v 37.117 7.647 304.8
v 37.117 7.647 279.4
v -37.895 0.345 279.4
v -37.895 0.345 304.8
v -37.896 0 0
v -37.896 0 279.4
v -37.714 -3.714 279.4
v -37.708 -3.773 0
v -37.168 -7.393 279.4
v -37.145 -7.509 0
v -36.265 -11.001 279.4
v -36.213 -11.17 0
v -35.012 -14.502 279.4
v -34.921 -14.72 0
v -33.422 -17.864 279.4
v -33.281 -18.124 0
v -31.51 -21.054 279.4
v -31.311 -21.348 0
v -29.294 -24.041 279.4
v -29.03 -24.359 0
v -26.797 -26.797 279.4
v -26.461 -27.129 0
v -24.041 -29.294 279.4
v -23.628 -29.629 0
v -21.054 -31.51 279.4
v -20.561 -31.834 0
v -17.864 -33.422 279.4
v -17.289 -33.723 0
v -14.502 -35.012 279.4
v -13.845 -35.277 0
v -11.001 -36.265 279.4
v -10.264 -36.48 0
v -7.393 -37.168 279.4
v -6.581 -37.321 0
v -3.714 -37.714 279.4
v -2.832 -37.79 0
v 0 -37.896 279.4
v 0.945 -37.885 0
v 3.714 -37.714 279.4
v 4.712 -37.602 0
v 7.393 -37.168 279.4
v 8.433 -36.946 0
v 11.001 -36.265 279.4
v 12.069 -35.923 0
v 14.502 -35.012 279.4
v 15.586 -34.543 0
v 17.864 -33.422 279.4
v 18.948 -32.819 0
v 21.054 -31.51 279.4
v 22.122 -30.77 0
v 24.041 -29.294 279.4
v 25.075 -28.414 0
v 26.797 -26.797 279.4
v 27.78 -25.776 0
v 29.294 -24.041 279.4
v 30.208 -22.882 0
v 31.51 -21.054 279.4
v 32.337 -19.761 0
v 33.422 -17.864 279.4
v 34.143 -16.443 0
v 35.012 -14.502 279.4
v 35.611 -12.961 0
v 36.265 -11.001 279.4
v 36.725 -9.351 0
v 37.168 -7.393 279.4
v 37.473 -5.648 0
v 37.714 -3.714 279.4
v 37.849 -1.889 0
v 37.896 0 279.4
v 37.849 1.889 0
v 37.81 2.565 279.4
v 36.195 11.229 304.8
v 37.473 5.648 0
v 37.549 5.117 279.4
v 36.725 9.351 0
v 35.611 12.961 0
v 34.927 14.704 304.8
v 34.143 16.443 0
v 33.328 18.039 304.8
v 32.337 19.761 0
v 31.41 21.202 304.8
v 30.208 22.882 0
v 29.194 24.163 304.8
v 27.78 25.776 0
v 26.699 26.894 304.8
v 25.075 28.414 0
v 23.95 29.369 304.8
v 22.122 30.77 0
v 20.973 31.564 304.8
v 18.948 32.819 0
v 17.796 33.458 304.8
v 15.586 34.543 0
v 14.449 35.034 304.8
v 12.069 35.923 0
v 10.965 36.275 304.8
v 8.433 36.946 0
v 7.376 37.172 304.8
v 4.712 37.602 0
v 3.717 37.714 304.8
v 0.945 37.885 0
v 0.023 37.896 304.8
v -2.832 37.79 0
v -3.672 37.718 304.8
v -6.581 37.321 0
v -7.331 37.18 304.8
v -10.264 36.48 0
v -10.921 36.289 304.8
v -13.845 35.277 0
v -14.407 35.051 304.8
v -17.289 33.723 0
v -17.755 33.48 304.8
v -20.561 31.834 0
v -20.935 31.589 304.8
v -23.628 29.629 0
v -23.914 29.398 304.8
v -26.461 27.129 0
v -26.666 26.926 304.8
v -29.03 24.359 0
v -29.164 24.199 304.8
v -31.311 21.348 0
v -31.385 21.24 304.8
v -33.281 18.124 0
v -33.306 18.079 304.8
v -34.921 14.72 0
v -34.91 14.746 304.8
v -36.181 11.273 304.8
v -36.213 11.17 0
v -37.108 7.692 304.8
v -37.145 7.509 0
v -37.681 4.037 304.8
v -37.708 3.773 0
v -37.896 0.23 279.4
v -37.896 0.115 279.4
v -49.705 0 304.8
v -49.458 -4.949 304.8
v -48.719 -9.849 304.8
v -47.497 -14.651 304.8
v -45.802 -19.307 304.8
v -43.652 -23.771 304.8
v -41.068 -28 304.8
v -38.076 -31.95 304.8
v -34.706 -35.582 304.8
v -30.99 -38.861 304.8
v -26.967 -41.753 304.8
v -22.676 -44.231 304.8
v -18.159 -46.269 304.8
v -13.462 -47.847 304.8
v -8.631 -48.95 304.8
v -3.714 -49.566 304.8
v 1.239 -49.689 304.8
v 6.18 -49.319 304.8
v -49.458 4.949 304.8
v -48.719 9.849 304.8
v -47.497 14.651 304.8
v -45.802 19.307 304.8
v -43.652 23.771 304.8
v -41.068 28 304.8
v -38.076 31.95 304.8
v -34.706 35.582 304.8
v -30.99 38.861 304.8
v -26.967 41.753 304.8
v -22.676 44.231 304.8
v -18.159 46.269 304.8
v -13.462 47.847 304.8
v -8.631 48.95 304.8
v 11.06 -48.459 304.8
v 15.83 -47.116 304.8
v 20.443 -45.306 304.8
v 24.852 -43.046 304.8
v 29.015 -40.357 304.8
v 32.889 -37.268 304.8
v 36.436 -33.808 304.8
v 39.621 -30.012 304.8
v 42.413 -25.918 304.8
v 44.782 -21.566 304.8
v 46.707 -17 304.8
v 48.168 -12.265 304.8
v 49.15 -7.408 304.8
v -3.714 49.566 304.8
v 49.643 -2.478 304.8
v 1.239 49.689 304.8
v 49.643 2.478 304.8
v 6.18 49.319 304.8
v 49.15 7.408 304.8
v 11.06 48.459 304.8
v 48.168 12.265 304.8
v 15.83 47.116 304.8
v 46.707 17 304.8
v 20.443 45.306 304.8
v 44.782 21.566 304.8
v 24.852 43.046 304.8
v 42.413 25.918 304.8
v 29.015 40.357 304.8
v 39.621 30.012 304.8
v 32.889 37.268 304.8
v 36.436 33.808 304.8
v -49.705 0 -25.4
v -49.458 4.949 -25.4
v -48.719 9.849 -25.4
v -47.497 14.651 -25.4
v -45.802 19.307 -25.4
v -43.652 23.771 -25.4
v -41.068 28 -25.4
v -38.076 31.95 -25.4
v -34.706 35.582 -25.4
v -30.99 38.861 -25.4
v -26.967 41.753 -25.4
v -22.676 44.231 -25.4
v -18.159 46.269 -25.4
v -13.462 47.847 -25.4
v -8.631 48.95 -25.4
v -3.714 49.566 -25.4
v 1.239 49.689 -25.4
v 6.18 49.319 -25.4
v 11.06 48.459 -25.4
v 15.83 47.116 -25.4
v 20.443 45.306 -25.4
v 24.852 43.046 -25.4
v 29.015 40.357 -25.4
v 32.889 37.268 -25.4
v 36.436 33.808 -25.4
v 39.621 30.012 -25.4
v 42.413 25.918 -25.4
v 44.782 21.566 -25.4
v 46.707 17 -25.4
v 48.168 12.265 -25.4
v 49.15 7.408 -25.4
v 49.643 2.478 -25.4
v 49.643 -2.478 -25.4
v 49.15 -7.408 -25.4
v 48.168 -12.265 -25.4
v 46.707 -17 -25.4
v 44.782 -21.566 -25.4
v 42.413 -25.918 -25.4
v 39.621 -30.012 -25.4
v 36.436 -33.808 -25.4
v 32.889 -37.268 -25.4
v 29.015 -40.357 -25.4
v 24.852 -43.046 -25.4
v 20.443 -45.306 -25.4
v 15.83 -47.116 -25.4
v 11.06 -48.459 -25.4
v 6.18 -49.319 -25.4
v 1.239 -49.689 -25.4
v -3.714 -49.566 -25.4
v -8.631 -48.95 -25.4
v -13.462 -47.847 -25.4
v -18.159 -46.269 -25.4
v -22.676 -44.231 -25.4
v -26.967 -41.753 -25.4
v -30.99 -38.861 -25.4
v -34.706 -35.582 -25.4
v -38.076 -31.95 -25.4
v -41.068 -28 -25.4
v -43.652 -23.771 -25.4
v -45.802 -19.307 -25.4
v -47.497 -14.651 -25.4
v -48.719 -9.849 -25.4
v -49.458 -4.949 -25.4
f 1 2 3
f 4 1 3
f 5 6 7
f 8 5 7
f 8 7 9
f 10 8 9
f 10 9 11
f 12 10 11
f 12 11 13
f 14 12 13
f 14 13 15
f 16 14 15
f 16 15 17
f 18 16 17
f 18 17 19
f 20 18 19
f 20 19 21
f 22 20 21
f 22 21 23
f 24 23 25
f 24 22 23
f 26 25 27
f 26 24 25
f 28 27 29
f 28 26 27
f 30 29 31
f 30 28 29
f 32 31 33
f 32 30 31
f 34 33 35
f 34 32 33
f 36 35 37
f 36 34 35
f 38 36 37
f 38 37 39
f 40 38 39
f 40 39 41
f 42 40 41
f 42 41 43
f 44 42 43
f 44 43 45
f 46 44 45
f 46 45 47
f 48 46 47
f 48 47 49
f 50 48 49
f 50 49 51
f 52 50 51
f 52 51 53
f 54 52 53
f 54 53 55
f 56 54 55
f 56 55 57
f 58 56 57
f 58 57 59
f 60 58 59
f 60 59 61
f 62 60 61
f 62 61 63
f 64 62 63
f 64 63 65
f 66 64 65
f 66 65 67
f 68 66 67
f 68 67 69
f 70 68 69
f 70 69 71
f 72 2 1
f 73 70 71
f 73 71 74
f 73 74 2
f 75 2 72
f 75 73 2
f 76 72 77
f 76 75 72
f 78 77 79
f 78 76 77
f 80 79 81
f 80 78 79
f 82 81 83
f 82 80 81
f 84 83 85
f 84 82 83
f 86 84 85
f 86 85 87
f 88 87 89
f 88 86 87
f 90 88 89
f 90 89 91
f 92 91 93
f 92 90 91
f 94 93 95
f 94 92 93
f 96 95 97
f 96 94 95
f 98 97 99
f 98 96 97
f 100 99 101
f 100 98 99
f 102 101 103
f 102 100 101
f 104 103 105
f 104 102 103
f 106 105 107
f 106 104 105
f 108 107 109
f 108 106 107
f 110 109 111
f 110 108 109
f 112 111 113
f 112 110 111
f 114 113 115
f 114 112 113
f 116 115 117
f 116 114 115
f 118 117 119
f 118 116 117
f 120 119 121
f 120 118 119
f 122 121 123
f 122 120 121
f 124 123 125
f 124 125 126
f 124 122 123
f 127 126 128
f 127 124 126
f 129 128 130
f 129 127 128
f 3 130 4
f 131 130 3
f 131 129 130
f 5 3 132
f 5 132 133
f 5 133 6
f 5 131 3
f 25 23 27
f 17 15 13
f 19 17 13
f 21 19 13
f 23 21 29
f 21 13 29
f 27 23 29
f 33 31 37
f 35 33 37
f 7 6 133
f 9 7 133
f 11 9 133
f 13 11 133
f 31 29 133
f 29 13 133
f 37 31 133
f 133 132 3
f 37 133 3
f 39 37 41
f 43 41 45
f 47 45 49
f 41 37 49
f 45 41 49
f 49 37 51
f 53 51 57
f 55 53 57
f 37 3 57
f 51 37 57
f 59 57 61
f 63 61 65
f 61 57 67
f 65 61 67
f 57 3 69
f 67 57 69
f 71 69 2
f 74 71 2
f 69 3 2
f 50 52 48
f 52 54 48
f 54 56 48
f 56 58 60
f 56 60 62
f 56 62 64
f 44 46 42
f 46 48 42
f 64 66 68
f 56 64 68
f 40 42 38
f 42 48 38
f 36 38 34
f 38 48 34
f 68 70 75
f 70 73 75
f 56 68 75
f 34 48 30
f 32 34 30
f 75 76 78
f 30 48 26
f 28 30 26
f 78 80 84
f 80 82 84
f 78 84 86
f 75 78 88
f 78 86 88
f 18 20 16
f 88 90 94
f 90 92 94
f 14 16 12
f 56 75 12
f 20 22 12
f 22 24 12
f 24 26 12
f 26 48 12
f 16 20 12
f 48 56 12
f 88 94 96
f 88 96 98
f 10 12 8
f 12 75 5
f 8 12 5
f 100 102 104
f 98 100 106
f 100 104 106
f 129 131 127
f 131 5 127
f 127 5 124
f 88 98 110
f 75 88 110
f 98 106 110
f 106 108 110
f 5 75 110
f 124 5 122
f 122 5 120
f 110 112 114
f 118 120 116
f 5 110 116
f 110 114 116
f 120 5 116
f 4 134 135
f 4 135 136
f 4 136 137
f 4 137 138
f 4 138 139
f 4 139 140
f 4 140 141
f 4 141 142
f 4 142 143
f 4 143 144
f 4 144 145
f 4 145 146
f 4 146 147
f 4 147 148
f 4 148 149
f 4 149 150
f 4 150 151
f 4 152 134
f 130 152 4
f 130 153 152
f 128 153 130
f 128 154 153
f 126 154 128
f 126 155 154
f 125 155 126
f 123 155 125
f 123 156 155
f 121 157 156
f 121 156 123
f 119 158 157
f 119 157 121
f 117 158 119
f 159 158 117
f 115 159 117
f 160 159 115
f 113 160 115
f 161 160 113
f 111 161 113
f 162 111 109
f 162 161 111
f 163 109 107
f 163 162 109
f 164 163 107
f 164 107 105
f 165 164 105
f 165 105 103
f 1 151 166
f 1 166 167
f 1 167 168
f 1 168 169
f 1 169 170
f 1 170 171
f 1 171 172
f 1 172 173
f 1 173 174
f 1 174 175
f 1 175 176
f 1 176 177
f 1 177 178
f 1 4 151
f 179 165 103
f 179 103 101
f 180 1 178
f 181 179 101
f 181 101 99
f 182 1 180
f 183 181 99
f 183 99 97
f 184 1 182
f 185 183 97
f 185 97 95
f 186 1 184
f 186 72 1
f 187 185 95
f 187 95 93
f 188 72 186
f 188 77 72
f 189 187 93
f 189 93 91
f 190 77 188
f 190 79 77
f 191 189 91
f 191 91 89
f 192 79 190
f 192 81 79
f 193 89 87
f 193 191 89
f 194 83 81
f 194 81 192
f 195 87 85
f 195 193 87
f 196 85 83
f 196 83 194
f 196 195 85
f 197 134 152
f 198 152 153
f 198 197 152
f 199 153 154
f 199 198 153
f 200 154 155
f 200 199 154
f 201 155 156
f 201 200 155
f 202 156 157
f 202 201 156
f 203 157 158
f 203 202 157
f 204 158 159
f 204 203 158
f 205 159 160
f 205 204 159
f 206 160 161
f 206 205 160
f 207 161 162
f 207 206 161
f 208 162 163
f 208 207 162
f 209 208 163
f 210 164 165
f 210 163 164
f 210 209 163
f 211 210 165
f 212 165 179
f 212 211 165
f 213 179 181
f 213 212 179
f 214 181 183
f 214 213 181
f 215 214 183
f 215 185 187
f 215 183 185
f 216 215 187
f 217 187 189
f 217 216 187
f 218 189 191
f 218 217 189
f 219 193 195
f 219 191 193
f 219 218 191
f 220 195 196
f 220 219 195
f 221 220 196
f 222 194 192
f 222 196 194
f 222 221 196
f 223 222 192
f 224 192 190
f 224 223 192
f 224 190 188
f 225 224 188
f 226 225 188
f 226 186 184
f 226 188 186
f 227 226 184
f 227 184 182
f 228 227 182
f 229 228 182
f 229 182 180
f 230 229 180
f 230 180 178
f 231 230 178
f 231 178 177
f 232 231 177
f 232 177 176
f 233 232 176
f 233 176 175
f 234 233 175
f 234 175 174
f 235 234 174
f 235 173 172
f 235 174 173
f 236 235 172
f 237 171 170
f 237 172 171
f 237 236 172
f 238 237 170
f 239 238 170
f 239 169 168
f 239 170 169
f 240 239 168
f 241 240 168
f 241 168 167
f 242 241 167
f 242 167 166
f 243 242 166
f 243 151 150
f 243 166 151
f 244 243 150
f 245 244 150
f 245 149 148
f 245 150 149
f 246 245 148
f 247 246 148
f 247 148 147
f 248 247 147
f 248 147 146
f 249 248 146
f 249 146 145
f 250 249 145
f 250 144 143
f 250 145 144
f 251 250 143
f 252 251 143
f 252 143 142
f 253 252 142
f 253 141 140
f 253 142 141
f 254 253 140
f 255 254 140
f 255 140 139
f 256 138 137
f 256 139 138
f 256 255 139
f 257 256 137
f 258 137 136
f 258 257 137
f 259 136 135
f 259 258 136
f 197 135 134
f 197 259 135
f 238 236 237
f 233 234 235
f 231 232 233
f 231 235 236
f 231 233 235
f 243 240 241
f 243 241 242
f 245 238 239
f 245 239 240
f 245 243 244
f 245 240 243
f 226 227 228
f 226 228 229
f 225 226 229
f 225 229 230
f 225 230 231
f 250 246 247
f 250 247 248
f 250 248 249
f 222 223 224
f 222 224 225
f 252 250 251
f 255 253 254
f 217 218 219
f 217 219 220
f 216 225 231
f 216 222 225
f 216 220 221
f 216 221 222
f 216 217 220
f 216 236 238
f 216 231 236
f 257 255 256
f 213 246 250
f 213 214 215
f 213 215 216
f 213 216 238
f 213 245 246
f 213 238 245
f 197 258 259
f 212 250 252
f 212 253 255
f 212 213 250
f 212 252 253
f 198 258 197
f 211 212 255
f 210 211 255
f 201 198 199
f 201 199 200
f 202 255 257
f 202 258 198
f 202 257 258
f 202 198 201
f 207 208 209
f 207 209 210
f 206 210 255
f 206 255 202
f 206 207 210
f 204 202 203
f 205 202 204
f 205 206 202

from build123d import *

# Parameters (mm, degrees)
SKETCH1_R           = 49.704747918
SKETCH1_R_2         = 37.896378772
BOSS_EXTRUDE1_DEPTH = 304.8
BOSS_EXTRUDE2_START = 25.4
SKETCH2_R           = 49.704747918
BOSS_EXTRUDE2_DEPTH = 25.4
BOSS_EXTRUDE3_START = -25.4
BOSS_EXTRUDE3_DEPTH = 25.4


with BuildPart() as part:
    # Sketch1 → Boss-Extrude1 (new body)
    with BuildSketch(Plane.XY):
        with Locations(Location((0, 0, 0), (0, 0, 180))):
            Circle(SKETCH1_R)
        with Locations(Location((0, 0, 0), (0, 0, 180))):
            Circle(SKETCH1_R_2, mode=Mode.SUBTRACT)
    extrude(amount=BOSS_EXTRUDE1_DEPTH)

    # Sketch2 → Boss-Extrude2 (add)
    with BuildSketch(Plane(origin=(0, 0, 0), x_dir=(-1, 0, 0), z_dir=(0, 0, -1)).offset(BOSS_EXTRUDE2_START)):
        Circle(SKETCH2_R)
    extrude(amount=-BOSS_EXTRUDE2_DEPTH)

    # Sketch3 → Boss-Extrude3 (add)
    with BuildSketch(Plane.XY.offset(304.8).offset(BOSS_EXTRUDE3_START)):
        with BuildLine():
            ThreePointArc((37.896378772, 0), (37.700998174, 3.843209698), (37.116871006, 7.64679088))
            Line((37.116871006, 7.64679088), (-37.894810184, 0.344797316))
            ThreePointArc((-37.894810184, 0.344797316), (-0.172400442, -37.895986623), (37.896378772, 0))
        make_face()
    extrude(amount=BOSS_EXTRUDE3_DEPTH)


solid = part.part
